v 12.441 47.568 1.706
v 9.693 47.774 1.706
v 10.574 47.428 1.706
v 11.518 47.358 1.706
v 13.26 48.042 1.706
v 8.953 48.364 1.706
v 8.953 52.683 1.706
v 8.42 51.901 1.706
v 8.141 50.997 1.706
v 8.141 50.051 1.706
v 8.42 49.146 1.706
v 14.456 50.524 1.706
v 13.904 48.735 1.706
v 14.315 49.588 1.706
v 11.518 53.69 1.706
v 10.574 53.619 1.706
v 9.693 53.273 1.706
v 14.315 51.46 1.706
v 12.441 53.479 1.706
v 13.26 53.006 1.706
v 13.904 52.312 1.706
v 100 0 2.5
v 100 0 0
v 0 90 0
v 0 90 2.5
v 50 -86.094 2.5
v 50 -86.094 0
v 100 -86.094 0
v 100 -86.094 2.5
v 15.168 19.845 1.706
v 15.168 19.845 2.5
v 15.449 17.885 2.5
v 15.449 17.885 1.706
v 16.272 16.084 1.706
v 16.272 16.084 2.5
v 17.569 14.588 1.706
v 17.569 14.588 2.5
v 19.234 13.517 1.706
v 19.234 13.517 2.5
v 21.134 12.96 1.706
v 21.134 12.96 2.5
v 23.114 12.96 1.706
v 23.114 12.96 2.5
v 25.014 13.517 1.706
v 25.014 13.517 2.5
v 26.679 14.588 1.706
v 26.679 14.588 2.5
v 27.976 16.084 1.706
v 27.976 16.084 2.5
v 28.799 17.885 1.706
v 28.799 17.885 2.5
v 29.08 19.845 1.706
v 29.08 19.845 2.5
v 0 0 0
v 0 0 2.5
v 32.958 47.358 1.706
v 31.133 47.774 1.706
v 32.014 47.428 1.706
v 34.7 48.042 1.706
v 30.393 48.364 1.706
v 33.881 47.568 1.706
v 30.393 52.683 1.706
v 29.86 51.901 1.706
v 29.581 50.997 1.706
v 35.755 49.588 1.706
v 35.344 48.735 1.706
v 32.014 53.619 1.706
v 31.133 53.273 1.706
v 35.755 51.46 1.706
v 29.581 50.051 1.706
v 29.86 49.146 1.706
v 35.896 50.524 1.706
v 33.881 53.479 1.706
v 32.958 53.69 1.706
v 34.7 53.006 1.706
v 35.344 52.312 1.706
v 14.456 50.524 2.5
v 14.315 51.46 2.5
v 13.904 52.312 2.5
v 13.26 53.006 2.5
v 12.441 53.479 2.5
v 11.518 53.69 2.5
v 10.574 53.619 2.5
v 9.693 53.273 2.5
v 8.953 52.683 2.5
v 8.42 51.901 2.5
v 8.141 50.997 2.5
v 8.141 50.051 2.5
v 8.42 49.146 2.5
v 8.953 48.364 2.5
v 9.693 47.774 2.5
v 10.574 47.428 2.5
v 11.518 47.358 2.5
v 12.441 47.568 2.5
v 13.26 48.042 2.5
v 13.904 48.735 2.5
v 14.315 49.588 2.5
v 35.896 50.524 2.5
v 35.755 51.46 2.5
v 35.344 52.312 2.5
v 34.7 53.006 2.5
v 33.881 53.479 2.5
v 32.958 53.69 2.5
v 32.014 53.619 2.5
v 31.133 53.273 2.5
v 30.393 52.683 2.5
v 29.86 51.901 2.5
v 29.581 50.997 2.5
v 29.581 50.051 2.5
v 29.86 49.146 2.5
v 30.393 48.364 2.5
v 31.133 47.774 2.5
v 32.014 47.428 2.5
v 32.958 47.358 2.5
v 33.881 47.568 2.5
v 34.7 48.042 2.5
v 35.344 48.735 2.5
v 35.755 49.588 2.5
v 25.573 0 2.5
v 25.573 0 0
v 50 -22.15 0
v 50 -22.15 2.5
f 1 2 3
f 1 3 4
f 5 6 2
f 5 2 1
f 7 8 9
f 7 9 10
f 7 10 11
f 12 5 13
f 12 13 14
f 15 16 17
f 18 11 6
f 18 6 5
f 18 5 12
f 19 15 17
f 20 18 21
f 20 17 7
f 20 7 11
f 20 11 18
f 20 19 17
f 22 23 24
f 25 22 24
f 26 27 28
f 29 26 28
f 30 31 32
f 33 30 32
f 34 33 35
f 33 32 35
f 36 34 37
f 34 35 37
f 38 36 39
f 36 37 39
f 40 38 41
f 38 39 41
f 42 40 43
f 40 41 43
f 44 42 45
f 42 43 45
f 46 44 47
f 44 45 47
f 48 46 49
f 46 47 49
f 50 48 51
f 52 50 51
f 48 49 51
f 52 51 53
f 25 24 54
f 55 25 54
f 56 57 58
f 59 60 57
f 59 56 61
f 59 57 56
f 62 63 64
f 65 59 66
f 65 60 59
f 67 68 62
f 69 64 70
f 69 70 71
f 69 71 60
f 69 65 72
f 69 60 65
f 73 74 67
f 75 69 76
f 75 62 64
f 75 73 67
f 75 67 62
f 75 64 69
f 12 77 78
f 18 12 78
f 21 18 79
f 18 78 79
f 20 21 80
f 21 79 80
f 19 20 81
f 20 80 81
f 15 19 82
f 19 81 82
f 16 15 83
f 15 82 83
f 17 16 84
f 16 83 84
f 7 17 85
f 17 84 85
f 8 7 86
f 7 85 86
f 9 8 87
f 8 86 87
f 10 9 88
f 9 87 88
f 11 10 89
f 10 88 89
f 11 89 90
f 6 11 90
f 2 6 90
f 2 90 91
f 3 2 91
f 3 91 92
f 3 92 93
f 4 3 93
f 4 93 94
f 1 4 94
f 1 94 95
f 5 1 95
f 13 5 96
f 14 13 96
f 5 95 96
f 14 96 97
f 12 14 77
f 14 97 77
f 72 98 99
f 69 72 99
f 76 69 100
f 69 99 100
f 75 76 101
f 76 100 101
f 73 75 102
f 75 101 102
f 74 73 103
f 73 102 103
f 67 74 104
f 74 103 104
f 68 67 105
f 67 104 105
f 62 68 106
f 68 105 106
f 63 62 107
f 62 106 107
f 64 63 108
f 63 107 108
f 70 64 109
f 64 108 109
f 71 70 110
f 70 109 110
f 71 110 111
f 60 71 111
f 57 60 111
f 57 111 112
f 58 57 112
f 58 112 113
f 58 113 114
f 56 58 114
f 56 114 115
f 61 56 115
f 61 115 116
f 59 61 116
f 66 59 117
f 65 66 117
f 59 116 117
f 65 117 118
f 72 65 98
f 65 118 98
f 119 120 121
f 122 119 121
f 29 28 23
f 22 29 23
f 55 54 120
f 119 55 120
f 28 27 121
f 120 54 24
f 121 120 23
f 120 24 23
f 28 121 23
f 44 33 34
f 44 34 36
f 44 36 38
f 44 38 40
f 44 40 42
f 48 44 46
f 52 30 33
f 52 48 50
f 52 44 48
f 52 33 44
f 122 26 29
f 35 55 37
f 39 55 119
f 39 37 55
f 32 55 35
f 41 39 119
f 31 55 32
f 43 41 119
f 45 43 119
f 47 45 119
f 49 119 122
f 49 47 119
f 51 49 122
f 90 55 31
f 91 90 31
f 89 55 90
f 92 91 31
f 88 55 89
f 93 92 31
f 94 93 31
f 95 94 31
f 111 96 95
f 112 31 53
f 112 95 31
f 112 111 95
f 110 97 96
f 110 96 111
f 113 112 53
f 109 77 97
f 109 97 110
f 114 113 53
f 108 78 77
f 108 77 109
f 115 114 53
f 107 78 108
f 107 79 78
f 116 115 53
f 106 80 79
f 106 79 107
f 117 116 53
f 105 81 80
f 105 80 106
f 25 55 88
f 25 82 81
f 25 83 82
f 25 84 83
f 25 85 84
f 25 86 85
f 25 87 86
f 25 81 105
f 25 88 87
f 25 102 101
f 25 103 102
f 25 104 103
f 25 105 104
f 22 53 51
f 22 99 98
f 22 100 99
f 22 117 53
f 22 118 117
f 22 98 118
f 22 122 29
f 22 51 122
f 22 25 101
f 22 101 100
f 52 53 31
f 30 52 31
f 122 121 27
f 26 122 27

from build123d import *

# Parameters (mm, degrees)
F1_DEPTH = 2.5
F3_R     = 3.175
F4_DEPTH = 0.79375


with BuildPart() as f1:
    # F0 (on Top) → F1 (new body)
    with BuildSketch(Plane.XY):
        Polygon((0, 90), (0, 0), (25.572903, 0), (50, -22.149762), (50, -86.09388), (100, -86.09388), (100, 0), align=None)
    extrude(amount=F1_DEPTH)

    # F3 (on face) → F4 (cut)
    with BuildSketch(Plane.XY.offset(2.5)):
        with BuildLine():
            Line((29.080364, 19.845134), (15.167672, 19.845134))
            ThreePointArc((15.167672, 19.845134), (22.124018, 12.888788), (29.080364, 19.845134))
        make_face()
        with Locations((11.280774, 50.523829)):
            Circle(F3_R)
        with Locations((32.720824, 50.523829)):
            Circle(F3_R)
    extrude(amount=-F4_DEPTH, mode=Mode.SUBTRACT)


solid = f1.part
